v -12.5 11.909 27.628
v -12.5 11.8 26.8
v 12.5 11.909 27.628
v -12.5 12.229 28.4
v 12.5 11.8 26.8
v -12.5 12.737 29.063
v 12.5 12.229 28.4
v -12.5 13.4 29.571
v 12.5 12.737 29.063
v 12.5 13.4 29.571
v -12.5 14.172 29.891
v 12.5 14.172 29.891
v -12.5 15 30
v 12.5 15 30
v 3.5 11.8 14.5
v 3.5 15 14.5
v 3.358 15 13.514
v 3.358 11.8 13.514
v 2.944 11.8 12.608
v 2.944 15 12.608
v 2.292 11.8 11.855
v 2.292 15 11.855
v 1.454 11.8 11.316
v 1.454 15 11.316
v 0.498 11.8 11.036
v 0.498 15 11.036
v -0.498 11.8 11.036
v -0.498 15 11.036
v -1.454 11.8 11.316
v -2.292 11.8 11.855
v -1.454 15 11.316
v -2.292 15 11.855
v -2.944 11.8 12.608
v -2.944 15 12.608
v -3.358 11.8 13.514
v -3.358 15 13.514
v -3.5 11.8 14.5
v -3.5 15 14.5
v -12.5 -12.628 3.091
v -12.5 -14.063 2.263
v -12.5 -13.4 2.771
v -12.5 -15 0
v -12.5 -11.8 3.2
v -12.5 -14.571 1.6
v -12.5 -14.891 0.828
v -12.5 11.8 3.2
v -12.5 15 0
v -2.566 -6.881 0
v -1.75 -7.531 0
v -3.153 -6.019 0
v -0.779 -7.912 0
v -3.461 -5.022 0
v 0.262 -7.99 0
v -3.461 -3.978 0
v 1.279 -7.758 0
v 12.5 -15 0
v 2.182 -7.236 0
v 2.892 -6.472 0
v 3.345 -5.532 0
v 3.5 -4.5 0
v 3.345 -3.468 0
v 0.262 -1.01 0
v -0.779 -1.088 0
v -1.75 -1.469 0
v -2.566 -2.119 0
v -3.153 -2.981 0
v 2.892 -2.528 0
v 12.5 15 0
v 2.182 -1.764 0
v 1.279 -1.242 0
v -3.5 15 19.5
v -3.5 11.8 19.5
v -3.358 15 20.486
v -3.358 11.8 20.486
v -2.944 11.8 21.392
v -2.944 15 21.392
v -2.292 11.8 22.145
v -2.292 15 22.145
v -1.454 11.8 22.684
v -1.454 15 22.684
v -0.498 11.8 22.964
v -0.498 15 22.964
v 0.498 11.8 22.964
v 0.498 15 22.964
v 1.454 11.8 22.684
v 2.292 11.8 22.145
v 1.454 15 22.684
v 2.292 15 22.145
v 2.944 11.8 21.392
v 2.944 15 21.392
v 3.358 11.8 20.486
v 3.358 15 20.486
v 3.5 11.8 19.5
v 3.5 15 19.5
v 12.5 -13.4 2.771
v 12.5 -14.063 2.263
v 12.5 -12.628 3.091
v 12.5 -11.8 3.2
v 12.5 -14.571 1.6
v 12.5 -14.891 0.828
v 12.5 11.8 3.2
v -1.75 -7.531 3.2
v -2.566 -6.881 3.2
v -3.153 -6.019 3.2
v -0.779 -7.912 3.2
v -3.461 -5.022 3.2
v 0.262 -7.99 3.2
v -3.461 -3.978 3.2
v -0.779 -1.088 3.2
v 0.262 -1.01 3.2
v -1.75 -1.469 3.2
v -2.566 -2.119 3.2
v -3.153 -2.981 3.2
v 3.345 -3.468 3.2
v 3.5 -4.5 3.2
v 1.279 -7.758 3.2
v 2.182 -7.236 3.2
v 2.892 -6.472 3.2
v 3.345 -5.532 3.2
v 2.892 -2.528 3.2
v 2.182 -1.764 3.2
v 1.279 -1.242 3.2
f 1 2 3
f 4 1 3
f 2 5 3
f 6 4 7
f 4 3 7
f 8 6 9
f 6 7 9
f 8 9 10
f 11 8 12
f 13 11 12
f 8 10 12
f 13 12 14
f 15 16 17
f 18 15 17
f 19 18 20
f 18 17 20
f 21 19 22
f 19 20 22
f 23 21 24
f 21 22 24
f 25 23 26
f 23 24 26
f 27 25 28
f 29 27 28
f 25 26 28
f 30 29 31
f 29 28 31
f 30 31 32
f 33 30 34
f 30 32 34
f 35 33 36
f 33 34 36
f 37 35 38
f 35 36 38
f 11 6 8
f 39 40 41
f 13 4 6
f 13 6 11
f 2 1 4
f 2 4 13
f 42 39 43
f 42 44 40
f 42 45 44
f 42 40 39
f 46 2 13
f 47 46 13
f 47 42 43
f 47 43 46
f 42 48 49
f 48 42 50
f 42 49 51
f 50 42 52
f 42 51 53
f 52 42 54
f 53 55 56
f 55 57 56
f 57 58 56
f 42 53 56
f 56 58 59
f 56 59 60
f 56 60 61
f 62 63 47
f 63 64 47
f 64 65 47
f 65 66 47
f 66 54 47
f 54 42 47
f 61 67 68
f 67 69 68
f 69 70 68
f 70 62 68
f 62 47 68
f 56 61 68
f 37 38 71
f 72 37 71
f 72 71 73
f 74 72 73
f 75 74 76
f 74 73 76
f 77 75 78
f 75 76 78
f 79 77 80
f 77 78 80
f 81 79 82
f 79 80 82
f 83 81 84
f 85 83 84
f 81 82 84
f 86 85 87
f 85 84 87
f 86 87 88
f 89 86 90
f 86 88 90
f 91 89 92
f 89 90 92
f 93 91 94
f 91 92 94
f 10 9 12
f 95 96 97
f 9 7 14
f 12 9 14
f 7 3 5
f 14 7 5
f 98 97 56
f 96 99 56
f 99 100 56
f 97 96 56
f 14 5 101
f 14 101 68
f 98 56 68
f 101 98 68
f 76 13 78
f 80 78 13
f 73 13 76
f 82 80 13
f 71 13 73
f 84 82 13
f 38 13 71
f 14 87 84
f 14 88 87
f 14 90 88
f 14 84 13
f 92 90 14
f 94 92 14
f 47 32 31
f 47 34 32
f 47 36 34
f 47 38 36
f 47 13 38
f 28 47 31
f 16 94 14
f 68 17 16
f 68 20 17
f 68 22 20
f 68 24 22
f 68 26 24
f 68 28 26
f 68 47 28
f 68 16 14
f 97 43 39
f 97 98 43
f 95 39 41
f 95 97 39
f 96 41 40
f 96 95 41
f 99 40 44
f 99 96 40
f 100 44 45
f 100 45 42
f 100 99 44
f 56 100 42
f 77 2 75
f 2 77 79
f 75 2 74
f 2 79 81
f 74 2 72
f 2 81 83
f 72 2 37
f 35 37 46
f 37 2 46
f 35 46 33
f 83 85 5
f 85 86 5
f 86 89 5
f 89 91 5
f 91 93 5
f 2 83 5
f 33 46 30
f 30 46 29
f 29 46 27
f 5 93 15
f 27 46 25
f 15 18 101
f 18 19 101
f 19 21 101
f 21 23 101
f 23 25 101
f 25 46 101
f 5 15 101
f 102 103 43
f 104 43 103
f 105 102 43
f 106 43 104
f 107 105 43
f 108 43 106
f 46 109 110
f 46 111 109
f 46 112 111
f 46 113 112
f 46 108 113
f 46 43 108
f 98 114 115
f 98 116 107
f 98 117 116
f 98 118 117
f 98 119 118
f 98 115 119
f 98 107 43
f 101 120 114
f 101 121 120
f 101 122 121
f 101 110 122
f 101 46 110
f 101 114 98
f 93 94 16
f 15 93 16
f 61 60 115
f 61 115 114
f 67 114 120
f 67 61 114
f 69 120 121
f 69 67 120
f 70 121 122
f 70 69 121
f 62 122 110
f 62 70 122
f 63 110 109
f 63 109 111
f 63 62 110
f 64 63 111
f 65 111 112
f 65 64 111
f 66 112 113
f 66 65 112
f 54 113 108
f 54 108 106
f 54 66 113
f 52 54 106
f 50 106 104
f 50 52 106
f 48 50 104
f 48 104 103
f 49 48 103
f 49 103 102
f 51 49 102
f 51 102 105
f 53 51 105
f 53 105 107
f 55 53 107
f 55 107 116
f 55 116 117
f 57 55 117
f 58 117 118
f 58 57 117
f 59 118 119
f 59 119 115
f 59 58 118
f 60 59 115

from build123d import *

# Parameters (mm, degrees)
F0_W     = 25
F0_H     = 26.8
F0_R     = 3.5
F1_DEPTH = 3.2
F0_H_2   = 3.2
F2_DEPTH = 30
F4_DEPTH = 3.2
F5_R     = 3.19999
F6_R     = 3.19999


# Not quite as in the source:
# - a fillet or chamfer is up to 0.001 mm smaller than in the source, because OpenCascade refuses the exact size


with BuildPart() as f1:
    # F0 (on Top) → F1 (new body)
    with BuildSketch(Plane.XY):
        with Locations((0, -1.6)):
            Rectangle(F0_W, F0_H)
        with Locations((0, -4.5)):
            Circle(F0_R, mode=Mode.SUBTRACT)
    extrude(amount=F1_DEPTH)

    # F0 (on Top) → F2 (join)
    with BuildSketch(Plane.XY):
        with Locations((0, 13.4)):
            Rectangle(F0_W, F0_H_2)
    extrude(amount=F2_DEPTH)

    # F3 (on face) → F4 (cut)
    with BuildSketch(Plane(origin=(0, 15, 0), x_dir=(-1, 0, 0), z_dir=(0, 1, 0))):
        with BuildLine():
            Line((-3.5, 19.5), (-3.5, 14.5))
            ThreePointArc((-3.5, 14.5), (0, 11), (3.5, 14.5))
            Line((3.5, 14.5), (3.5, 19.5))
            ThreePointArc((3.5, 19.5), (0, 23), (-3.5, 19.5))
        make_face()
    extrude(amount=-F4_DEPTH, mode=Mode.SUBTRACT)

    # F5 (radius 3.2 in the source; OpenCascade refuses exactly that, so slightly less here)
    f5_edges = [f1.edges().sort_by_distance(p)[0] for p in [
        (0, 11.8, 30),
    ]]
    fillet(f5_edges, radius=F5_R)

    # F6 (radius 3.2 in the source; OpenCascade refuses exactly that, so slightly less here)
    f6_edges = [f1.edges().sort_by_distance(p)[0] for p in [
        (0, -15, 3.2),
    ]]
    fillet(f6_edges, radius=F6_R)


solid = f1.part
